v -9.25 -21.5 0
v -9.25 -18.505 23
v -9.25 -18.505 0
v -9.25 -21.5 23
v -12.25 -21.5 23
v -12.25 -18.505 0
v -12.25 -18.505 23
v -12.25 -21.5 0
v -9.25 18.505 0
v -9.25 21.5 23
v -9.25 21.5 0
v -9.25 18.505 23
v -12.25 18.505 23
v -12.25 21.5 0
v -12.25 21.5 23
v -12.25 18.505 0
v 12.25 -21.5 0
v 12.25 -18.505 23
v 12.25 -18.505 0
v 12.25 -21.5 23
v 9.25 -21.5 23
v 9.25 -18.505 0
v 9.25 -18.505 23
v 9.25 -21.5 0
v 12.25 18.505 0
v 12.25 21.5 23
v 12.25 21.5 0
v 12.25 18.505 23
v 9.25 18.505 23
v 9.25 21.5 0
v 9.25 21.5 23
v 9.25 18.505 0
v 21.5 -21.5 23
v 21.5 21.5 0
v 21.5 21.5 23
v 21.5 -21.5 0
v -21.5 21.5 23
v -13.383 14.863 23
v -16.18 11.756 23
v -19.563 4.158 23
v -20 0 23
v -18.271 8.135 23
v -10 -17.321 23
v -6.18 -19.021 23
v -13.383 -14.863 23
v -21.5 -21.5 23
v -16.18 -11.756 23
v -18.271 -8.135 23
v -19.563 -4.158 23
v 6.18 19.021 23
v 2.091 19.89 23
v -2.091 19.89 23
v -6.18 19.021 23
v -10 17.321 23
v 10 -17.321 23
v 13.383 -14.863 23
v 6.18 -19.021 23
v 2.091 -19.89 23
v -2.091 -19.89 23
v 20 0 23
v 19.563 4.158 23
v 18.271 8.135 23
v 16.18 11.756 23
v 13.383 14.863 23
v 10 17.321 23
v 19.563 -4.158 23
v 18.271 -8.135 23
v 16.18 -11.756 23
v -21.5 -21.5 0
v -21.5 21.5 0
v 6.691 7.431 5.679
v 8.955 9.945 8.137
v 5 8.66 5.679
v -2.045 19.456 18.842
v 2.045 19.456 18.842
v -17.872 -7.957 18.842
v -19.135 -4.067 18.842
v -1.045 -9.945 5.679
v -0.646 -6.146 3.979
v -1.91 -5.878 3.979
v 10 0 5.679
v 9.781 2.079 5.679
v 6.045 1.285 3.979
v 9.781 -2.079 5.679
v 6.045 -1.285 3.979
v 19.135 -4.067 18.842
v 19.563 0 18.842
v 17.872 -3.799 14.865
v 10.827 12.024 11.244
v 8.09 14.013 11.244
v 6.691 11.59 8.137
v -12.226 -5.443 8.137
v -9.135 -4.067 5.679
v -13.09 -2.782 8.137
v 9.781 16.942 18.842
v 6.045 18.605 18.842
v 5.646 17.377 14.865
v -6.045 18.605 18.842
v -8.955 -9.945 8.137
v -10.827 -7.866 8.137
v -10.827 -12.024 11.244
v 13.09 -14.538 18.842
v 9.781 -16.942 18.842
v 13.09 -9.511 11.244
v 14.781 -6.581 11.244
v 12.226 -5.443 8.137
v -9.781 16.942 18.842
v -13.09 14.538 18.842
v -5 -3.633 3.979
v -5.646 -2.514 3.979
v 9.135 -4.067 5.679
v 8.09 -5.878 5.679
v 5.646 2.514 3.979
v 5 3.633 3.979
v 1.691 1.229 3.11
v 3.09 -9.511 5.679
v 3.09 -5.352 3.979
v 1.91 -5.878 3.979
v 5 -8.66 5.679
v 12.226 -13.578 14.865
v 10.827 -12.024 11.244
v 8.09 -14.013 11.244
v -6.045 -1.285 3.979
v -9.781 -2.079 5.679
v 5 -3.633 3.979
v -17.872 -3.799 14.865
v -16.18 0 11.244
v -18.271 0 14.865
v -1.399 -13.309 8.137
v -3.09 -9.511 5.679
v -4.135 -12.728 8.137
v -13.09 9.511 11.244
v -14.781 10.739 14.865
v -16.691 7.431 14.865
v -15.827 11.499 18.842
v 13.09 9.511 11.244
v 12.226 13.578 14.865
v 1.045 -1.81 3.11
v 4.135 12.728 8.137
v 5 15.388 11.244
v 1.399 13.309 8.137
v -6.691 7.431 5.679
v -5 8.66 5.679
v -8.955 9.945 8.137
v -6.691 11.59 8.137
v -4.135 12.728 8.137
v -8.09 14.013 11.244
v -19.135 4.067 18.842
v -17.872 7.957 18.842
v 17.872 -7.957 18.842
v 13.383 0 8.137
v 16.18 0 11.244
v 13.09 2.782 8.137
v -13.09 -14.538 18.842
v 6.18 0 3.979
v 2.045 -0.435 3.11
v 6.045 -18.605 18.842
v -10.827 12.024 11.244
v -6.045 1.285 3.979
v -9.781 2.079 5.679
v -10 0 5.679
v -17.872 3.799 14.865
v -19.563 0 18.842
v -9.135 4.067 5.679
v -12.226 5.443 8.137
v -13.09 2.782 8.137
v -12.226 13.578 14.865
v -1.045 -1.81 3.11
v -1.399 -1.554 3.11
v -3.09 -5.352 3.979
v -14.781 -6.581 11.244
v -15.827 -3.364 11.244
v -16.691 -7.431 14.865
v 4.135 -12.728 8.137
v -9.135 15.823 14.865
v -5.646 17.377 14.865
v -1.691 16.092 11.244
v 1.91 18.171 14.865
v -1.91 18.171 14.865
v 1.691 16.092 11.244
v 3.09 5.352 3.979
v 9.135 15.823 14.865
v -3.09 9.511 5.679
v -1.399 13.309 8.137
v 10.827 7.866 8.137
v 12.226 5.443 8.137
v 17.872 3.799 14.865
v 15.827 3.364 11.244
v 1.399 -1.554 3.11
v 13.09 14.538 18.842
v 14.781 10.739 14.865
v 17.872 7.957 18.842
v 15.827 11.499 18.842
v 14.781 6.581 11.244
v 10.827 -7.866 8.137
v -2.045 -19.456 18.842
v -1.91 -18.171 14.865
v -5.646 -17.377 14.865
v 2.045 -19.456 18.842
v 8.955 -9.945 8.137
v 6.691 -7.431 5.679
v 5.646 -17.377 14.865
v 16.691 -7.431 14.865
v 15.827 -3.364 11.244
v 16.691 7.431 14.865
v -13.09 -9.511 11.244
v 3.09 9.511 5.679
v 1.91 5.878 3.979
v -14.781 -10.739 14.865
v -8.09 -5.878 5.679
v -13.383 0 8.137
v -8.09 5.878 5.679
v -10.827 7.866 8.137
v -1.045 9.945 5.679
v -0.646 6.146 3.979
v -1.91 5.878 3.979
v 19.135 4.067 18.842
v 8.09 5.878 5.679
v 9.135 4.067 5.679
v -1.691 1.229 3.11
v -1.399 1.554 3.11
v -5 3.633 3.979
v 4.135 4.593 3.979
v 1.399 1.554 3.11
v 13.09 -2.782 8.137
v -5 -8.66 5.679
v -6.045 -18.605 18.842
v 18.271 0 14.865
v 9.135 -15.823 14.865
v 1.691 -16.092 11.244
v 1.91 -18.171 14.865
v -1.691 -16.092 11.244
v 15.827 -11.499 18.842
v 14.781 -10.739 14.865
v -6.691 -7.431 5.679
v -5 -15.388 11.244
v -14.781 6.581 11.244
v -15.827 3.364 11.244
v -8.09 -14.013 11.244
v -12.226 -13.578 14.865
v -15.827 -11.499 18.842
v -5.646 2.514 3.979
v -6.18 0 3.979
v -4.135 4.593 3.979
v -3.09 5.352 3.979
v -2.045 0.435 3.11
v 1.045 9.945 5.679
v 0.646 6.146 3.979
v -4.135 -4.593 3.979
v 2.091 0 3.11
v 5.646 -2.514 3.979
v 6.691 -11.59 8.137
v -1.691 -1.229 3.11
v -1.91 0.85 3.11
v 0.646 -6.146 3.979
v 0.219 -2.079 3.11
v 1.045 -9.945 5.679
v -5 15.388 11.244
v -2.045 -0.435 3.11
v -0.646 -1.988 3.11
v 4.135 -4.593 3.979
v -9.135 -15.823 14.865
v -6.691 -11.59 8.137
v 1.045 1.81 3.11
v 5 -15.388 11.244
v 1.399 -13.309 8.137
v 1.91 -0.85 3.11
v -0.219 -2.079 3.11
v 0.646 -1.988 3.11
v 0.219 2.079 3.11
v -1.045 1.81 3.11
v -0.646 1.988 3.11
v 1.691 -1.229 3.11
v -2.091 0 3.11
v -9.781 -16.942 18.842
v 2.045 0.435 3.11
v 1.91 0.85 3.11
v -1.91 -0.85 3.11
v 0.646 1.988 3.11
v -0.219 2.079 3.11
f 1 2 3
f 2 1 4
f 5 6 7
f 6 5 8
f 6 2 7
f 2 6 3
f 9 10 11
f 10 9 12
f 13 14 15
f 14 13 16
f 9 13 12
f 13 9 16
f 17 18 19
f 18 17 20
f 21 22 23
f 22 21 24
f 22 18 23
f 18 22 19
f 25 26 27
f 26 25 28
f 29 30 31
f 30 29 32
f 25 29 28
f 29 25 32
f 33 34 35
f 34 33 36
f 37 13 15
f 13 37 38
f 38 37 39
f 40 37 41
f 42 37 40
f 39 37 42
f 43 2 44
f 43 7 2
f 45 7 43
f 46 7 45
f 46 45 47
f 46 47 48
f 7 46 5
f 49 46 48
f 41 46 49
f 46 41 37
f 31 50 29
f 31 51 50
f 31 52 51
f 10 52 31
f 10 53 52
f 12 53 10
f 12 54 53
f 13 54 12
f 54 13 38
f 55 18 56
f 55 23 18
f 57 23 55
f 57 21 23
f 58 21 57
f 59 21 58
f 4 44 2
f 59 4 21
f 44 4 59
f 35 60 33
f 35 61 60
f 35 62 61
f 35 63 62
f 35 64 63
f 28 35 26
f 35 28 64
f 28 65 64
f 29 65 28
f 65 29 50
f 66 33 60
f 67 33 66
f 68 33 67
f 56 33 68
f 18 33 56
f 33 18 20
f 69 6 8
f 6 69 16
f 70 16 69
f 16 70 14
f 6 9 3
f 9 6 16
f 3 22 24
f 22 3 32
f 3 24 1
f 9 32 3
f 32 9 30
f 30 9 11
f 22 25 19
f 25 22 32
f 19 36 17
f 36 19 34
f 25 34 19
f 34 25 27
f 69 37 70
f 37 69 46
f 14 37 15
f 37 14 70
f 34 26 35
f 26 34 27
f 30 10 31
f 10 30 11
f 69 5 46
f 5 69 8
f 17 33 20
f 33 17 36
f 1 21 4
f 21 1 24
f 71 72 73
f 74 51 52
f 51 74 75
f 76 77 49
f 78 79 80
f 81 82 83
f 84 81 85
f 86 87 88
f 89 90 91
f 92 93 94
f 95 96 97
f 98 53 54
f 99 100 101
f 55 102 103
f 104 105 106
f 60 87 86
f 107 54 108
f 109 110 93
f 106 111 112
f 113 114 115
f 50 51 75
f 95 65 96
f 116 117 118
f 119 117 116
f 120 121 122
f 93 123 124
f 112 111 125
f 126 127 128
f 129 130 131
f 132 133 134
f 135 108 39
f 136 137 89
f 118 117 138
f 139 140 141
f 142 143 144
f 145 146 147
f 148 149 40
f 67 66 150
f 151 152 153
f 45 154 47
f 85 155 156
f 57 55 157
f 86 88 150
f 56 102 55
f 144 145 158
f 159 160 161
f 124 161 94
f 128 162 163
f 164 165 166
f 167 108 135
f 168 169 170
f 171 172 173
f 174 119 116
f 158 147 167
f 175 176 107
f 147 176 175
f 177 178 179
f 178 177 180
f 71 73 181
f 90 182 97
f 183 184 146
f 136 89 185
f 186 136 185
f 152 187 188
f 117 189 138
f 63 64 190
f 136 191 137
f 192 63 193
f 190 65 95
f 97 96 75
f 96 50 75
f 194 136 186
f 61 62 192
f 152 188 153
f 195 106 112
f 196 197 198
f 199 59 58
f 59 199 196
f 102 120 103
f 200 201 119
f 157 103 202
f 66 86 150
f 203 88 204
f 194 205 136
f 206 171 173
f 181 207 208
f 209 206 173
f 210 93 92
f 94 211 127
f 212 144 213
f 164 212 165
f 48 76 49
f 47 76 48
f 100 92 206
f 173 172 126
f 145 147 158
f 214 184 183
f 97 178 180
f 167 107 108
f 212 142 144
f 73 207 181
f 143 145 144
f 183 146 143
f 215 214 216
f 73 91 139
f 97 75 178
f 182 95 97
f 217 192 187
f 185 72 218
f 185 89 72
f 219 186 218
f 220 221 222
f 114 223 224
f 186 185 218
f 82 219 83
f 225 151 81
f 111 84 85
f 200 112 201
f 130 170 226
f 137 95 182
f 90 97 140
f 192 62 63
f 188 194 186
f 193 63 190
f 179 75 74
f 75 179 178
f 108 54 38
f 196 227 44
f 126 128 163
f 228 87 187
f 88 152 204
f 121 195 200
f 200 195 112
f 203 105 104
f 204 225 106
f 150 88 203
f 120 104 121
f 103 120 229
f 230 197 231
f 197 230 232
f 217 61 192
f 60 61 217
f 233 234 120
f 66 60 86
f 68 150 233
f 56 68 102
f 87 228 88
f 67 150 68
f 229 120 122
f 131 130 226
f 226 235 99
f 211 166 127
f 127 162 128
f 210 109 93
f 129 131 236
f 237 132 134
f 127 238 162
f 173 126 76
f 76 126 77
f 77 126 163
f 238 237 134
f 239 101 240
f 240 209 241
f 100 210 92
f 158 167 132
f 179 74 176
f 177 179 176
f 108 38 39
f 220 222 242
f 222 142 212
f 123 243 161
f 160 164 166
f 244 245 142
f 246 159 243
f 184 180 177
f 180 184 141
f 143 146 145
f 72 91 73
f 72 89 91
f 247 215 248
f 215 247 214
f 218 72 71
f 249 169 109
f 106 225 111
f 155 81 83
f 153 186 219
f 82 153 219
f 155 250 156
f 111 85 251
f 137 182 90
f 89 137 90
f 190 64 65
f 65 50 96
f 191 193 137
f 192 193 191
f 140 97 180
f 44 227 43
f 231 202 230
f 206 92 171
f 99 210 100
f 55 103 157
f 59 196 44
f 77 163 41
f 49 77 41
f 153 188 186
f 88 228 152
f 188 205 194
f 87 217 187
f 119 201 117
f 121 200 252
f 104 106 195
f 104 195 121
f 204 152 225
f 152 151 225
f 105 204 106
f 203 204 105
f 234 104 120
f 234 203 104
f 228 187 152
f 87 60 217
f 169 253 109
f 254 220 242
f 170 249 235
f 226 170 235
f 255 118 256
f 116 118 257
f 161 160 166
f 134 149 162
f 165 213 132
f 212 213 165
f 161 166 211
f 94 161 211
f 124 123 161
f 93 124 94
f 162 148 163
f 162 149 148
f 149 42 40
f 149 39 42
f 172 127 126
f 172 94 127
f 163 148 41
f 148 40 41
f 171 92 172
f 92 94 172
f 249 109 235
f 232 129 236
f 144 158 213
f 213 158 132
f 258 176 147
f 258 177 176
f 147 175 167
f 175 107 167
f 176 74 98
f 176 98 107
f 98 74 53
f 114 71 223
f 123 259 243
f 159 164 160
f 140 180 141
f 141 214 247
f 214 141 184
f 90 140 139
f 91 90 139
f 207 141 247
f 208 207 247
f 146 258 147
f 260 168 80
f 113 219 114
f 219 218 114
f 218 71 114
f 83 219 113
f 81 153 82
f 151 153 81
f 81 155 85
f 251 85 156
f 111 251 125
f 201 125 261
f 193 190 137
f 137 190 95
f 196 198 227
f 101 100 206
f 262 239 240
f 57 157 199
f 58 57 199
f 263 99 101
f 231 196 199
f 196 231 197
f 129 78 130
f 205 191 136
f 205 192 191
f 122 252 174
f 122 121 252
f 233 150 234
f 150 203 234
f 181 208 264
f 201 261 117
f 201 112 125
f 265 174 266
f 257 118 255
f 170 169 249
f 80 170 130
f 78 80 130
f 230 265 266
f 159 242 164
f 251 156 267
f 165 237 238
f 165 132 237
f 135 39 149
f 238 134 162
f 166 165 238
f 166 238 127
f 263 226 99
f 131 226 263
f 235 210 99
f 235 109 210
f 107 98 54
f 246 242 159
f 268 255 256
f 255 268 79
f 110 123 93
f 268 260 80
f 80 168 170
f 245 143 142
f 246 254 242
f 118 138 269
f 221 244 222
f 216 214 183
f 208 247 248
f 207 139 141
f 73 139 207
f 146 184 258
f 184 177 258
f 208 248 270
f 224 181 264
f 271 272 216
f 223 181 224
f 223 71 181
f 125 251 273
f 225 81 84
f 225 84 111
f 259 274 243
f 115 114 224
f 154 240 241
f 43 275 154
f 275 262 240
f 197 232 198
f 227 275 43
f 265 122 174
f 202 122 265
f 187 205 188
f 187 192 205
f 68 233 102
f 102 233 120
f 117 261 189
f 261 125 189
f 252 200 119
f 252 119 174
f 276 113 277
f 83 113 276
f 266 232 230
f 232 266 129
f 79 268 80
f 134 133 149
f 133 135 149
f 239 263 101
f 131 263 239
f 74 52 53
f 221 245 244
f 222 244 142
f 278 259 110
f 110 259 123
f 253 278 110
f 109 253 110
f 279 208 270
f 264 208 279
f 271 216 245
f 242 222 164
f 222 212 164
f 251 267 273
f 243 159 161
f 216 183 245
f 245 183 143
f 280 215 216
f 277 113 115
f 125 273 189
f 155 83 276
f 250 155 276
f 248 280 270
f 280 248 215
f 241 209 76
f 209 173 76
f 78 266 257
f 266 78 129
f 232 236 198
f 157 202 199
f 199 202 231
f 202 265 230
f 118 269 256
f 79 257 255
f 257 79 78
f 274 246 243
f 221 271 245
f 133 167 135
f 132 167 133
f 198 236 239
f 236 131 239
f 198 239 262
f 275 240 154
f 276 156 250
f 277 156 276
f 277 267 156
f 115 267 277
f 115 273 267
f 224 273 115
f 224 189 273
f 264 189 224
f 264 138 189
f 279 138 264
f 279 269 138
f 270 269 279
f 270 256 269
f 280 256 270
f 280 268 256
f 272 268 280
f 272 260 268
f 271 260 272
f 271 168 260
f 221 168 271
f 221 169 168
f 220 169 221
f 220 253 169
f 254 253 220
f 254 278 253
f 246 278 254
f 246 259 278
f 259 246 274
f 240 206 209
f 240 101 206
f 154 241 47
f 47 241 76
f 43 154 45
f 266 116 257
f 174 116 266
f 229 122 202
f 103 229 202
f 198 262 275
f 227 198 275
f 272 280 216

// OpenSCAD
ball_diameter = 40.0;
wall = 3.0;
gap = 0;
e = 0.01;
slot = 3.0;
cube_size = [ball_diameter+wall,
             ball_diameter+wall,
             ball_diameter/2+wall-gap];

module jig() {
  difference() {
    translate([-cube_size[0]/2, -cube_size[1]/2, 0]) cube(cube_size);
    translate([0, 0, ball_diameter/2+wall]) sphere(d=ball_diameter);
    for (i = [-cube_size[0]/4, cube_size[0]/4]) {
        for (j = [(slot-cube_size[1]-e)/2, (e+cube_size[1]-slot)/2]) {
            translate([i,j,0]) cube([slot, slot, ball_diameter+wall*2+e], center=true);
        }
    }
  }
}

jig();
